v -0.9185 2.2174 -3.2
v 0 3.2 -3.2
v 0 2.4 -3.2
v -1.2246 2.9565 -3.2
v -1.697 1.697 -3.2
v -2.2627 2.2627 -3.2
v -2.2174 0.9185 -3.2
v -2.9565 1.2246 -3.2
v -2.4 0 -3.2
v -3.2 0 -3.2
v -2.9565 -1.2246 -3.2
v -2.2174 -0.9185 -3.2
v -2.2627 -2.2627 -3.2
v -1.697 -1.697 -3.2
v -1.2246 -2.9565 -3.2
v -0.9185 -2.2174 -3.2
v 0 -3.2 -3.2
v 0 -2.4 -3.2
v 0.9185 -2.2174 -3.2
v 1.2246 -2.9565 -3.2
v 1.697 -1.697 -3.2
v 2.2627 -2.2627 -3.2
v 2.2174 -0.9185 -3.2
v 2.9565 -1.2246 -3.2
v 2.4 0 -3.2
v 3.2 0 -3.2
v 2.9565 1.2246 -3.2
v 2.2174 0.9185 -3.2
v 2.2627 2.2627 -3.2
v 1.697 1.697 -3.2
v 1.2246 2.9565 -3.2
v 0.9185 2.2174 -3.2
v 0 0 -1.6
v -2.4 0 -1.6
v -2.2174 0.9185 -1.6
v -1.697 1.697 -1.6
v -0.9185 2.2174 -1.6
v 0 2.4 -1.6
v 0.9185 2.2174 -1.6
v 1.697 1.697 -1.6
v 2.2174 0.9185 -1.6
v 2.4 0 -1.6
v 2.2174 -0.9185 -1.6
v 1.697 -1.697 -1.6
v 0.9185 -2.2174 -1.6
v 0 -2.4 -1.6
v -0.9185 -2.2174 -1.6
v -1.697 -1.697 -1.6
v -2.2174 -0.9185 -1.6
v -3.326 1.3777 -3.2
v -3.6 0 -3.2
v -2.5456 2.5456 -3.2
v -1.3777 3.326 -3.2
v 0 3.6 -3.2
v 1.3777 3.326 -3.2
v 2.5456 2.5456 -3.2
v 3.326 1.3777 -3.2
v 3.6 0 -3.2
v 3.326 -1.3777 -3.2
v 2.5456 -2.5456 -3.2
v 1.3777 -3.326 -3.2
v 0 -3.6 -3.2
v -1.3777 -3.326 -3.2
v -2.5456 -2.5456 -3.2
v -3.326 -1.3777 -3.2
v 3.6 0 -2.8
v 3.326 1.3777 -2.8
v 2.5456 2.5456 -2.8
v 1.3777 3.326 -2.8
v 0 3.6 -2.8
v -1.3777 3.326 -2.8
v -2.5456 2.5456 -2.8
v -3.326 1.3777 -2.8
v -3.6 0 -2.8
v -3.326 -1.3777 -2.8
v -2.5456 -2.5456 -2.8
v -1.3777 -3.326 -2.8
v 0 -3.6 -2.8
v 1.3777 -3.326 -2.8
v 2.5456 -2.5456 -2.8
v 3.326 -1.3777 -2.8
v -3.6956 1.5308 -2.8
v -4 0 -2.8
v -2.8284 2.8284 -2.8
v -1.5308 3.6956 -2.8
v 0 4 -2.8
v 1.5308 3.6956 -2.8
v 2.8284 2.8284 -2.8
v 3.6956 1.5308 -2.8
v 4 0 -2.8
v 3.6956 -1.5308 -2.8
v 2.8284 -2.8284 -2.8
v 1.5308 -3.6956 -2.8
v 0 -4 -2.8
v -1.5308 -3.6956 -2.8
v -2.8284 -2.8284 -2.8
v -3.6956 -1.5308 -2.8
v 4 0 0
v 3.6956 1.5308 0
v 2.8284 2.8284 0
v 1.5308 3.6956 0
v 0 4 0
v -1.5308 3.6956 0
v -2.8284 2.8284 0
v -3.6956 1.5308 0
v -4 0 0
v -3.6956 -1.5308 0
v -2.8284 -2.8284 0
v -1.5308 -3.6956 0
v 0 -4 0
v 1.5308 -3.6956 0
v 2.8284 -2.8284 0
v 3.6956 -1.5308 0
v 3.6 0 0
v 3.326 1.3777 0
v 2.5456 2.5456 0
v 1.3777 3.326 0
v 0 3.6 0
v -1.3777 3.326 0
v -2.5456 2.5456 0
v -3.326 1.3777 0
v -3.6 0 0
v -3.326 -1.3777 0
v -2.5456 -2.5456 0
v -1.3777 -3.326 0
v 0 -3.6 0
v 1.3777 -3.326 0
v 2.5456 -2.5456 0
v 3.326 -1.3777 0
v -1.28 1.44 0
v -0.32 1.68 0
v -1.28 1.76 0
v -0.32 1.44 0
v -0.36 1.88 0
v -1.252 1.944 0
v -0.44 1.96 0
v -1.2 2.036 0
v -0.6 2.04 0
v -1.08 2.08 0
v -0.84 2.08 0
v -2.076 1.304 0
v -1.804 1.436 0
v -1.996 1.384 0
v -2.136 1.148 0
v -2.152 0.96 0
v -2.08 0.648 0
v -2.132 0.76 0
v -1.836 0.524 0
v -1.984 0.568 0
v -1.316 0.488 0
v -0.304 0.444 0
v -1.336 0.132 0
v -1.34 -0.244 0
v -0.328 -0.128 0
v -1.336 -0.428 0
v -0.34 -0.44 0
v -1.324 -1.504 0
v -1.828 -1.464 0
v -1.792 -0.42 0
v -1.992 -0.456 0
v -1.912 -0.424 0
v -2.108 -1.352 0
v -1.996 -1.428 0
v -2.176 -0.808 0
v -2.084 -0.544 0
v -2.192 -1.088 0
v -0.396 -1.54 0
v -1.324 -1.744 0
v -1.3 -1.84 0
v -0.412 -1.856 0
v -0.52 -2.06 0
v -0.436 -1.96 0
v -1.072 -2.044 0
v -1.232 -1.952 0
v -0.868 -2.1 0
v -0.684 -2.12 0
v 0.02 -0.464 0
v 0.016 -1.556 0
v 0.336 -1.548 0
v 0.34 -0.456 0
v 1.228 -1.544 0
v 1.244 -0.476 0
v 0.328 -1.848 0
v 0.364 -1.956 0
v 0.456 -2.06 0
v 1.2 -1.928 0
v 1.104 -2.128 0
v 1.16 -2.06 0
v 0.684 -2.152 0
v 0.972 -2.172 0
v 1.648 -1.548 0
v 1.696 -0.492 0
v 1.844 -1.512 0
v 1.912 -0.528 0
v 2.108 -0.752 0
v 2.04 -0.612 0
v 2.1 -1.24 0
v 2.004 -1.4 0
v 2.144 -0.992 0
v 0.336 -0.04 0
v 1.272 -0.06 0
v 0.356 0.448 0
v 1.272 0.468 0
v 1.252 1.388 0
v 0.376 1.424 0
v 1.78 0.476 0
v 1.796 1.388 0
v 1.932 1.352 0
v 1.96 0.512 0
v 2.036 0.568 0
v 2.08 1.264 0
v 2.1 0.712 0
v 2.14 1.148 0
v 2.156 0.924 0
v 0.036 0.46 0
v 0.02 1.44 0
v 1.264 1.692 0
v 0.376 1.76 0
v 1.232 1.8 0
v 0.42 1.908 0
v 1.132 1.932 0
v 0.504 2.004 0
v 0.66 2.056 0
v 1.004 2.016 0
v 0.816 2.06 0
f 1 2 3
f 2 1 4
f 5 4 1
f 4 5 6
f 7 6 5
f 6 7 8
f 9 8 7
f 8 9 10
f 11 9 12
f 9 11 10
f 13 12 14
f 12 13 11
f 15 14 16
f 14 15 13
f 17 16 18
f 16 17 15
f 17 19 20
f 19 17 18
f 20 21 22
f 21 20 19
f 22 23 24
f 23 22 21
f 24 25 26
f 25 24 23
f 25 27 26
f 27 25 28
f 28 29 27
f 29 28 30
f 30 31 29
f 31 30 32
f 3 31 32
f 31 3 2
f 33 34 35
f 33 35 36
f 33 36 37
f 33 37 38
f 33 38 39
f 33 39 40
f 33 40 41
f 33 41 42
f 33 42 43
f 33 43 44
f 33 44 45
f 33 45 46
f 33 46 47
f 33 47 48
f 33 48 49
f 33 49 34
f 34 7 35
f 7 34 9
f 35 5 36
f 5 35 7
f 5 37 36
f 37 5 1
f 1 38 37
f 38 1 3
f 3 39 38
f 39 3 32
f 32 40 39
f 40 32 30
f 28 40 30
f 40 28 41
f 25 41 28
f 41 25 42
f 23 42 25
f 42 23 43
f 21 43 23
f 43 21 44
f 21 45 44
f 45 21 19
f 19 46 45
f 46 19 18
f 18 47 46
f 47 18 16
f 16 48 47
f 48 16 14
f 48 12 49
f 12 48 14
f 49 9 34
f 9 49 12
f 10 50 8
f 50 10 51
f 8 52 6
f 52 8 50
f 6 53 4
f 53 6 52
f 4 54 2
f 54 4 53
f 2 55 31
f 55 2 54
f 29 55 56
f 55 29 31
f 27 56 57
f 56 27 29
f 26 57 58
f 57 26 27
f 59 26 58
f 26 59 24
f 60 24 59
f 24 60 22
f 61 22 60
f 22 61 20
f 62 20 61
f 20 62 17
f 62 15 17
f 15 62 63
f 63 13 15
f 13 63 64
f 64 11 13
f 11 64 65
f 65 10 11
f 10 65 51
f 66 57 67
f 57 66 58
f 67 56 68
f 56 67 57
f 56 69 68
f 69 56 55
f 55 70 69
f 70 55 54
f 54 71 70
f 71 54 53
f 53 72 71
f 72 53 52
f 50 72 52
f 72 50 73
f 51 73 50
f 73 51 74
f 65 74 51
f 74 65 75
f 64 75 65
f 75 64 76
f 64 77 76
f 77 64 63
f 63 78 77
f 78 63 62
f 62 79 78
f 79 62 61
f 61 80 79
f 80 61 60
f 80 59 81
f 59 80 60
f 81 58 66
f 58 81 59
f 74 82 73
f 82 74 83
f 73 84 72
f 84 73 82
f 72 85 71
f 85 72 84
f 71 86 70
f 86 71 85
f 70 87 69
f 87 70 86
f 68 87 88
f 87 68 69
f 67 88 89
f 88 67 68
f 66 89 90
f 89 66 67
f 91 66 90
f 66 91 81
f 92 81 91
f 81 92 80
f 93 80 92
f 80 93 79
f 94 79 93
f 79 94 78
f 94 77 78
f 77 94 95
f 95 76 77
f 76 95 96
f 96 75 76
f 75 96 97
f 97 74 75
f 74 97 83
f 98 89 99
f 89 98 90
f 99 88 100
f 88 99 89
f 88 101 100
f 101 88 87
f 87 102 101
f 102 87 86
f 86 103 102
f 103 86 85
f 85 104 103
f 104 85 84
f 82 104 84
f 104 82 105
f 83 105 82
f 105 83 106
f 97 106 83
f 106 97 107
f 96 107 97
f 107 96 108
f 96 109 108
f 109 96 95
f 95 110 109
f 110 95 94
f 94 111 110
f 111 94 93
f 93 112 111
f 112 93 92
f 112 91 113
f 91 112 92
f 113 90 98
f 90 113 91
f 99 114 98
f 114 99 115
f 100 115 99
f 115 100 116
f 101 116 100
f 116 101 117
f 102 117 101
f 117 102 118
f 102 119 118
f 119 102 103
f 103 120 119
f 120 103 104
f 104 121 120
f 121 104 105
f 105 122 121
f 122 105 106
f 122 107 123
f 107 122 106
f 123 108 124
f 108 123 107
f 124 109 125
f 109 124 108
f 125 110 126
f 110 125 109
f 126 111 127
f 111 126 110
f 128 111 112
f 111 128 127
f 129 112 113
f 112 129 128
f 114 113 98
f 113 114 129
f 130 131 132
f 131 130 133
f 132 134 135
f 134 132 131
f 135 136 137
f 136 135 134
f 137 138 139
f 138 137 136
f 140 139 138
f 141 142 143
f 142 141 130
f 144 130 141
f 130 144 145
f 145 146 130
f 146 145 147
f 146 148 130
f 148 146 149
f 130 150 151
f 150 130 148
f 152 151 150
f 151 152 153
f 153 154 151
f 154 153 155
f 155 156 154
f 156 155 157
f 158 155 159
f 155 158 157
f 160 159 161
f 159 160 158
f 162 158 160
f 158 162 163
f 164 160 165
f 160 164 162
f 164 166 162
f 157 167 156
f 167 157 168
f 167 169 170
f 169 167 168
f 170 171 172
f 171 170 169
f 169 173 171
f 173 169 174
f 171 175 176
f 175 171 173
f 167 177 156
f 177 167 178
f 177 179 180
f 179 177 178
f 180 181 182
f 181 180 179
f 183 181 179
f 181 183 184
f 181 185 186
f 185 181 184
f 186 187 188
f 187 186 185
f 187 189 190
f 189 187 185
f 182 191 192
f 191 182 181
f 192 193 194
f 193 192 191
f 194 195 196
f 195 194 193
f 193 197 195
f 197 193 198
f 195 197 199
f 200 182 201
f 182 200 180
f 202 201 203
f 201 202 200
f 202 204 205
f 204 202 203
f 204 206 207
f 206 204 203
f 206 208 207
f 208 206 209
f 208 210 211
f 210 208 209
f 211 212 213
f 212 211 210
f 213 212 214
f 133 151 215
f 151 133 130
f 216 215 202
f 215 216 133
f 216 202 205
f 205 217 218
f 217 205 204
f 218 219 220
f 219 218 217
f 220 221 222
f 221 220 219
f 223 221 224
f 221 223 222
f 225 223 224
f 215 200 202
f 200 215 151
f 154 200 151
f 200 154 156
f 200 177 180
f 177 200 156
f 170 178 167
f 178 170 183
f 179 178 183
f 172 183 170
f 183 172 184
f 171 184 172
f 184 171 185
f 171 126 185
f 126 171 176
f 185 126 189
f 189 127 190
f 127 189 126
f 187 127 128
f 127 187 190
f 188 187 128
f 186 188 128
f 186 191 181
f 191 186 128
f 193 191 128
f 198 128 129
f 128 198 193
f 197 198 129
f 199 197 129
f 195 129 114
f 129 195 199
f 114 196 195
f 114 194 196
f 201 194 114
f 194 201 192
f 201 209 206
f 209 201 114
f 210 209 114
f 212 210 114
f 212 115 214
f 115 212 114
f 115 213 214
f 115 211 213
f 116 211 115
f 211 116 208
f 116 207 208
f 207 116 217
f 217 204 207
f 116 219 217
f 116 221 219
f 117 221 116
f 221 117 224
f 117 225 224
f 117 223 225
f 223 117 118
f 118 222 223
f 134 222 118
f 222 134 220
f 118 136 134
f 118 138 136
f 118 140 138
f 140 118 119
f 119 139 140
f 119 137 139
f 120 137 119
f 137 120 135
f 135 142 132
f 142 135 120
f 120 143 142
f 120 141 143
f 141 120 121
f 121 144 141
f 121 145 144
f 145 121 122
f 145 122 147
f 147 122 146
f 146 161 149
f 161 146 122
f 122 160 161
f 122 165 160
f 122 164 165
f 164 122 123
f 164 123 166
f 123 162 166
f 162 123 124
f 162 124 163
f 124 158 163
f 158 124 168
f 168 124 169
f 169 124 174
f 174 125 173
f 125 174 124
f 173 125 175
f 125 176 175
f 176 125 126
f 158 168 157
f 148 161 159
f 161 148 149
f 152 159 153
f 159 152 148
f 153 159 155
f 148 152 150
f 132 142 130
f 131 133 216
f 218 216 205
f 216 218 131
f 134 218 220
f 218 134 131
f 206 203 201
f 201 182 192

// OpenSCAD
use <../lib.scad>
use <../p/4-4ering.scad>
use <s/98138s01.scad>
$fa=1; $fs=0.2;
function ldraw_lib__98138p2f(realsolid=false) = [
// 0 Tile  1 x  1 Round with Dark Torquoise "#" on Lavender Background Pattern
// 0 Name: 98138p2f.dat
// 0 Author: Willy Tschager [Holly-Wood]
// 0 !LDRAW_ORG Part UPDATE 2023-01
// 0 !LICENSE Licensed under CC BY 2.0 and CC BY 4.0 : see CAreadme.txt
// 
// 0 BFC CERTIFY CCW
  [0,"BFC","CERTIFY"],
  [0,"BFC","CCW"],
// 
// 0 !KEYWORDS Dots, Hash, Hashtag, Number Sign, Octothorp Sign, Pound Sign
// 0 !KEYWORDS Set Creativity Box
// 
// 0 !HISTORY 2022-12-20 [PTadmin] Official Update 2022-06
// 0 !HISTORY 2022-12-23 [Cheenzo] Added missing leading spaces in description
// 0 !HISTORY 2023-03-05 [OrionP] Official Update 2023-01
// 
// 
// 0 // Based on 98138p1n.dat by Gerald Lasser [GeraldLasser]
// 
// 1 16 0 0 0 1 0 0 0 1 0 0 0 1 s\98138s01.dat
  [1,16,0,0,0,1,0,0,0,1,0,0,0,1, ldraw_lib__s__98138s01(realsolid)],
// 1 31 0 0 0 9 0 0 0 1 0 0 0 9 4-4ering.dat
  [1,31,0,0,0,9,0,0,0,1,0,0,0,9, ldraw_lib__4_4ering(realsolid)],
// 4 3 -3.2 0 4.4 -3.2 0 3.6 -.8 0 3.6 -.8 0 4.2
  [4,3,-3.2,0,4.4,-3.2,0,3.6,-.8,0,3.6,-.8,0,4.2],
// 4 3 -3.13 0 4.86 -3.2 0 4.4 -.8 0 4.2 -.9 0 4.7
  [4,3,-3.13,0,4.86,-3.2,0,4.4,-.8,0,4.2,-.9,0,4.7],
// 4 3 -3.13 0 4.86 -.9 0 4.7 -1.1 0 4.9 -3 0 5.09
  [4,3,-3.13,0,4.86,-.9,0,4.7,-1.1,0,4.9,-3,0,5.09],
// 4 3 -2.7 0 5.2 -3 0 5.09 -1.1 0 4.9 -1.5 0 5.1
  [4,3,-2.7,0,5.2,-3,0,5.09,-1.1,0,4.9,-1.5,0,5.1],
// 3 3 -2.1 0 5.2 -2.7 0 5.2 -1.5 0 5.1
  [3,3,-2.1,0,5.2,-2.7,0,5.2,-1.5,0,5.1],
// 4 3 -3.2 0 3.6 -4.51 0 3.59 -4.99 0 3.46 -5.19 0 3.26
  [4,3,-3.2,0,3.6,-4.51,0,3.59,-4.99,0,3.46,-5.19,0,3.26],
// 4 3 -3.2 0 3.6 -5.19 0 3.26 -5.34 0 2.87 -5.38 0 2.4
  [4,3,-3.2,0,3.6,-5.19,0,3.26,-5.34,0,2.87,-5.38,0,2.4],
// 4 3 -3.2 0 3.6 -5.38 0 2.4 -5.33 0 1.9 -5.2 0 1.62
  [4,3,-3.2,0,3.6,-5.38,0,2.4,-5.33,0,1.9,-5.2,0,1.62],
// 4 3 -3.2 0 3.6 -5.2 0 1.62 -4.96 0 1.42 -4.59 0 1.31
  [4,3,-3.2,0,3.6,-5.2,0,1.62,-4.96,0,1.42,-4.59,0,1.31],
// 4 3 -3.2 0 3.6 -4.59 0 1.31 -3.29 0 1.22 -.76 0 1.11
  [4,3,-3.2,0,3.6,-4.59,0,1.31,-3.29,0,1.22,-.76,0,1.11],
// 4 3 -.76 0 1.11 -3.29 0 1.22 -3.34 0 .33 -3.35 0 -.61
  [4,3,-.76,0,1.11,-3.29,0,1.22,-3.34,0,.33,-3.35,0,-.61],
// 4 3 -.82 0 -.32 -.76 0 1.11 -3.35 0 -.61 -3.34 0 -1.07
  [4,3,-.82,0,-.32,-.76,0,1.11,-3.35,0,-.61,-3.34,0,-1.07],
// 4 3 -.85 0 -1.1 -.82 0 -.32 -3.34 0 -1.07 -3.31 0 -3.76
  [4,3,-.85,0,-1.1,-.82,0,-.32,-3.34,0,-1.07,-3.31,0,-3.76],
// 4 3 -4.57 0 -3.66 -3.31 0 -3.76 -3.34 0 -1.07 -4.48 0 -1.05
  [4,3,-4.57,0,-3.66,-3.31,0,-3.76,-3.34,0,-1.07,-4.48,0,-1.05],
// 4 3 -4.57 0 -3.66 -4.48 0 -1.05 -4.78 0 -1.06 -4.98 0 -1.14
  [4,3,-4.57,0,-3.66,-4.48,0,-1.05,-4.78,0,-1.06,-4.98,0,-1.14],
// 4 3 -4.99 0 -3.57 -4.57 0 -3.66 -4.98 0 -1.14 -5.27 0 -3.38
  [4,3,-4.99,0,-3.57,-4.57,0,-3.66,-4.98,0,-1.14,-5.27,0,-3.38],
// 4 3 -5.27 0 -3.38 -4.98 0 -1.14 -5.21 0 -1.36 -5.44 0 -2.02
  [4,3,-5.27,0,-3.38,-4.98,0,-1.14,-5.21,0,-1.36,-5.44,0,-2.02],
// 3 3 -5.44 0 -2.02 -5.48 0 -2.72 -5.27 0 -3.38
  [3,3,-5.44,0,-2.02,-5.48,0,-2.72,-5.27,0,-3.38],
// 4 3 -.99 0 -3.85 -.85 0 -1.1 -3.31 0 -3.76 -3.31 0 -4.36
  [4,3,-.99,0,-3.85,-.85,0,-1.1,-3.31,0,-3.76,-3.31,0,-4.36],
// 4 3 -.99 0 -3.85 -3.31 0 -4.36 -3.25 0 -4.6 -1.03 0 -4.64
  [4,3,-.99,0,-3.85,-3.31,0,-4.36,-3.25,0,-4.6,-1.03,0,-4.64],
// 4 3 -1.09 0 -4.9 -1.03 0 -4.64 -3.25 0 -4.6 -1.3 0 -5.15
  [4,3,-1.09,0,-4.9,-1.03,0,-4.64,-3.25,0,-4.6,-1.3,0,-5.15],
// 4 3 -1.3 0 -5.15 -3.25 0 -4.6 -3.08 0 -4.88 -2.68 0 -5.11
  [4,3,-1.3,0,-5.15,-3.25,0,-4.6,-3.08,0,-4.88,-2.68,0,-5.11],
// 4 3 -1.3 0 -5.15 -2.68 0 -5.11 -2.17 0 -5.25 -1.71 0 -5.3
  [4,3,-1.3,0,-5.15,-2.68,0,-5.11,-2.17,0,-5.25,-1.71,0,-5.3],
// 4 3 -.85 0 -1.1 -.99 0 -3.85 .04 0 -3.89 .05 0 -1.16
  [4,3,-.85,0,-1.1,-.99,0,-3.85,.04,0,-3.89,.05,0,-1.16],
// 4 3 .05 0 -1.16 .04 0 -3.89 .84 0 -3.87 .85 0 -1.14
  [4,3,.05,0,-1.16,.04,0,-3.89,.84,0,-3.87,.85,0,-1.14],
// 4 3 .85 0 -1.14 .84 0 -3.87 3.07 0 -3.86 3.11 0 -1.19
  [4,3,.85,0,-1.14,.84,0,-3.87,3.07,0,-3.86,3.11,0,-1.19],
// 4 3 3.07 0 -3.86 .84 0 -3.87 .82 0 -4.62 .91 0 -4.89
  [4,3,3.07,0,-3.86,.84,0,-3.87,.82,0,-4.62,.91,0,-4.89],
// 4 3 3.07 0 -3.86 .91 0 -4.89 1.14 0 -5.15 3 0 -4.82
  [4,3,3.07,0,-3.86,.91,0,-4.89,1.14,0,-5.15,3,0,-4.82],
// 4 3 2.9 0 -5.15 3 0 -4.82 1.14 0 -5.15 2.76 0 -5.32
  [4,3,2.9,0,-5.15,3,0,-4.82,1.14,0,-5.15,2.76,0,-5.32],
// 4 3 2.43 0 -5.43 2.76 0 -5.32 1.14 0 -5.15 1.71 0 -5.38
  [4,3,2.43,0,-5.43,2.76,0,-5.32,1.14,0,-5.15,1.71,0,-5.38],
// 4 3 4.24 0 -1.23 3.11 0 -1.19 3.07 0 -3.86 4.12 0 -3.87
  [4,3,4.24,0,-1.23,3.11,0,-1.19,3.07,0,-3.86,4.12,0,-3.87],
// 4 3 4.24 0 -1.23 4.12 0 -3.87 4.61 0 -3.78 4.78 0 -1.32
  [4,3,4.24,0,-1.23,4.12,0,-3.87,4.61,0,-3.78,4.78,0,-1.32],
// 4 3 5.1 0 -1.53 4.78 0 -1.32 4.61 0 -3.78 5.27 0 -1.88
  [4,3,5.1,0,-1.53,4.78,0,-1.32,4.61,0,-3.78,5.27,0,-1.88],
// 4 3 5.27 0 -1.88 4.61 0 -3.78 5.01 0 -3.5 5.25 0 -3.1
  [4,3,5.27,0,-1.88,4.61,0,-3.78,5.01,0,-3.5,5.25,0,-3.1],
// 3 3 5.27 0 -1.88 5.25 0 -3.1 5.36 0 -2.48
  [3,3,5.27,0,-1.88,5.25,0,-3.1,5.36,0,-2.48],
// 4 3 .85 0 -1.14 3.11 0 -1.19 3.18 0 -.15 .84 0 -.1
  [4,3,.85,0,-1.14,3.11,0,-1.19,3.18,0,-.15,.84,0,-.1],
// 4 3 .89 0 1.12 .84 0 -.1 3.18 0 -.15 3.18 0 1.17
  [4,3,.89,0,1.12,.84,0,-.1,3.18,0,-.15,3.18,0,1.17],
// 4 3 .89 0 1.12 3.18 0 1.17 3.13 0 3.47 .94 0 3.56
  [4,3,.89,0,1.12,3.18,0,1.17,3.13,0,3.47,.94,0,3.56],
// 4 3 3.13 0 3.47 3.18 0 1.17 4.45 0 1.19 4.49 0 3.47
  [4,3,3.13,0,3.47,3.18,0,1.17,4.45,0,1.19,4.49,0,3.47],
// 4 3 4.83 0 3.38 4.49 0 3.47 4.45 0 1.19 4.9 0 1.28
  [4,3,4.83,0,3.38,4.49,0,3.47,4.45,0,1.19,4.9,0,1.28],
// 4 3 4.83 0 3.38 4.9 0 1.28 5.09 0 1.42 5.2 0 3.16
  [4,3,4.83,0,3.38,4.9,0,1.28,5.09,0,1.42,5.2,0,3.16],
// 4 3 5.2 0 3.16 5.09 0 1.42 5.25 0 1.78 5.35 0 2.87
  [4,3,5.2,0,3.16,5.09,0,1.42,5.25,0,1.78,5.35,0,2.87],
// 3 3 5.35 0 2.87 5.25 0 1.78 5.39 0 2.31
  [3,3,5.35,0,2.87,5.25,0,1.78,5.39,0,2.31],
// 4 3 -.76 0 1.11 .09 0 1.15 -.8 0 3.6 -3.2 0 3.6
  [4,3,-.76,0,1.11,.09,0,1.15,-.8,0,3.6,-3.2,0,3.6],
// 4 3 .05 0 3.6 -.8 0 3.6 .09 0 1.15 .89 0 1.12
  [4,3,.05,0,3.6,-.8,0,3.6,.09,0,1.15,.89,0,1.12],
// 3 3 .05 0 3.6 .89 0 1.12 .94 0 3.56
  [3,3,.05,0,3.6,.89,0,1.12,.94,0,3.56],
// 4 3 .94 0 4.4 .94 0 3.56 3.13 0 3.47 3.16 0 4.23
  [4,3,.94,0,4.4,.94,0,3.56,3.13,0,3.47,3.16,0,4.23],
// 4 3 .94 0 4.4 3.16 0 4.23 3.08 0 4.5 1.05 0 4.77
  [4,3,.94,0,4.4,3.16,0,4.23,3.08,0,4.5,1.05,0,4.77],
// 4 3 1.26 0 5.01 1.05 0 4.77 3.08 0 4.5 2.83 0 4.83
  [4,3,1.26,0,5.01,1.05,0,4.77,3.08,0,4.5,2.83,0,4.83],
// 4 3 1.26 0 5.01 2.83 0 4.83 2.51 0 5.04 1.65 0 5.14
  [4,3,1.26,0,5.01,2.83,0,4.83,2.51,0,5.04,1.65,0,5.14],
// 3 3 2.04 0 5.15 1.65 0 5.14 2.51 0 5.04
  [3,3,2.04,0,5.15,1.65,0,5.14,2.51,0,5.04],
// 4 31 .84 0 -.1 .89 0 1.12 .09 0 1.15 -.76 0 1.11
  [4,31,.84,0,-.1,.89,0,1.12,.09,0,1.15,-.76,0,1.11],
// 4 31 .84 0 -.1 -.76 0 1.11 -.82 0 -.32 -.85 0 -1.1
  [4,31,.84,0,-.1,-.76,0,1.11,-.82,0,-.32,-.85,0,-1.1],
// 4 31 .84 0 -.1 -.85 0 -1.1 .05 0 -1.16 .85 0 -1.14
  [4,31,.84,0,-.1,-.85,0,-1.1,.05,0,-1.16,.85,0,-1.14],
// 4 31 .04 0 -3.89 -.99 0 -3.85 -1.03 0 -4.64 .82 0 -4.62
  [4,31,.04,0,-3.89,-.99,0,-3.85,-1.03,0,-4.64,.82,0,-4.62],
// 3 31 .84 0 -3.87 .04 0 -3.89 .82 0 -4.62
  [3,31,.84,0,-3.87,.04,0,-3.89,.82,0,-4.62],
// 4 31 -1.03 0 -4.64 -1.09 0 -4.9 .91 0 -4.89 .82 0 -4.62
  [4,31,-1.03,0,-4.64,-1.09,0,-4.9,.91,0,-4.89,.82,0,-4.62],
// 4 31 -1.09 0 -4.9 -1.3 0 -5.15 1.14 0 -5.15 .91 0 -4.89
  [4,31,-1.09,0,-4.9,-1.3,0,-5.15,1.14,0,-5.15,.91,0,-4.89],
// 4 31 -1.3 0 -5.15 -1.71 0 -5.3 0 0 -9 1.14 0 -5.15
  [4,31,-1.3,0,-5.15,-1.71,0,-5.3,0,0,-9,1.14,0,-5.15],
// 3 31 1.14 0 -5.15 0 0 -9 1.71 0 -5.38
  [3,31,1.14,0,-5.15,0,0,-9,1.71,0,-5.38],
// 4 31 2.43 0 -5.43 1.71 0 -5.38 0 0 -9 3.4443 0 -8.3151
  [4,31,2.43,0,-5.43,1.71,0,-5.38,0,0,-9,3.4443,0,-8.3151],
// 4 31 2.76 0 -5.32 2.43 0 -5.43 3.4443 0 -8.3151 6.3639 0 -6.3639
  [4,31,2.76,0,-5.32,2.43,0,-5.43,3.4443,0,-8.3151,6.3639,0,-6.3639],
// 3 31 2.9 0 -5.15 2.76 0 -5.32 6.3639 0 -6.3639
  [3,31,2.9,0,-5.15,2.76,0,-5.32,6.3639,0,-6.3639],
// 3 31 3 0 -4.82 2.9 0 -5.15 6.3639 0 -6.3639
  [3,31,3,0,-4.82,2.9,0,-5.15,6.3639,0,-6.3639],
// 4 31 3.07 0 -3.86 3 0 -4.82 6.3639 0 -6.3639 4.12 0 -3.87
  [4,31,3.07,0,-3.86,3,0,-4.82,6.3639,0,-6.3639,4.12,0,-3.87],
// 3 31 4.61 0 -3.78 4.12 0 -3.87 6.3639 0 -6.3639
  [3,31,4.61,0,-3.78,4.12,0,-3.87,6.3639,0,-6.3639],
// 4 31 5.01 0 -3.5 4.61 0 -3.78 6.3639 0 -6.3639 8.3151 0 -3.4443
  [4,31,5.01,0,-3.5,4.61,0,-3.78,6.3639,0,-6.3639,8.3151,0,-3.4443],
// 3 31 5.25 0 -3.1 5.01 0 -3.5 8.3151 0 -3.4443
  [3,31,5.25,0,-3.1,5.01,0,-3.5,8.3151,0,-3.4443],
// 3 31 5.36 0 -2.48 5.25 0 -3.1 8.3151 0 -3.4443
  [3,31,5.36,0,-2.48,5.25,0,-3.1,8.3151,0,-3.4443],
// 4 31 5.27 0 -1.88 5.36 0 -2.48 8.3151 0 -3.4443 9 0 0
  [4,31,5.27,0,-1.88,5.36,0,-2.48,8.3151,0,-3.4443,9,0,0],
// 3 31 9 0 0 5.1 0 -1.53 5.27 0 -1.88
  [3,31,9,0,0,5.1,0,-1.53,5.27,0,-1.88],
// 3 31 9 0 0 4.78 0 -1.32 5.1 0 -1.53
  [3,31,9,0,0,4.78,0,-1.32,5.1,0,-1.53],
// 4 31 4.24 0 -1.23 4.78 0 -1.32 9 0 0 3.18 0 -.15
  [4,31,4.24,0,-1.23,4.78,0,-1.32,9,0,0,3.18,0,-.15],
// 4 31 4.45 0 1.19 3.18 0 -.15 9 0 0 4.9 0 1.28
  [4,31,4.45,0,1.19,3.18,0,-.15,9,0,0,4.9,0,1.28],
// 3 31 5.09 0 1.42 4.9 0 1.28 9 0 0
  [3,31,5.09,0,1.42,4.9,0,1.28,9,0,0],
// 3 31 5.25 0 1.78 5.09 0 1.42 9 0 0
  [3,31,5.25,0,1.78,5.09,0,1.42,9,0,0],
// 4 31 5.39 0 2.31 5.25 0 1.78 9 0 0 8.3151 0 3.4443
  [4,31,5.39,0,2.31,5.25,0,1.78,9,0,0,8.3151,0,3.4443],
// 3 31 8.3151 0 3.4443 5.35 0 2.87 5.39 0 2.31
  [3,31,8.3151,0,3.4443,5.35,0,2.87,5.39,0,2.31],
// 3 31 8.3151 0 3.4443 5.2 0 3.16 5.35 0 2.87
  [3,31,8.3151,0,3.4443,5.2,0,3.16,5.35,0,2.87],
// 4 31 4.83 0 3.38 5.2 0 3.16 8.3151 0 3.4443 6.3639 0 6.3639
  [4,31,4.83,0,3.38,5.2,0,3.16,8.3151,0,3.4443,6.3639,0,6.3639],
// 4 31 4.49 0 3.47 4.83 0 3.38 6.3639 0 6.3639 3.16 0 4.23
  [4,31,4.49,0,3.47,4.83,0,3.38,6.3639,0,6.3639,3.16,0,4.23],
// 3 31 3.16 0 4.23 3.13 0 3.47 4.49 0 3.47
  [3,31,3.16,0,4.23,3.13,0,3.47,4.49,0,3.47],
// 3 31 6.3639 0 6.3639 3.08 0 4.5 3.16 0 4.23
  [3,31,6.3639,0,6.3639,3.08,0,4.5,3.16,0,4.23],
// 3 31 6.3639 0 6.3639 2.83 0 4.83 3.08 0 4.5
  [3,31,6.3639,0,6.3639,2.83,0,4.83,3.08,0,4.5],
// 4 31 2.51 0 5.04 2.83 0 4.83 6.3639 0 6.3639 3.4443 0 8.3151
  [4,31,2.51,0,5.04,2.83,0,4.83,6.3639,0,6.3639,3.4443,0,8.3151],
// 3 31 3.4443 0 8.3151 2.04 0 5.15 2.51 0 5.04
  [3,31,3.4443,0,8.3151,2.04,0,5.15,2.51,0,5.04],
// 4 31 1.65 0 5.14 2.04 0 5.15 3.4443 0 8.3151 0 0 9
  [4,31,1.65,0,5.14,2.04,0,5.15,3.4443,0,8.3151,0,0,9],
// 3 31 0 0 9 1.26 0 5.01 1.65 0 5.14
  [3,31,0,0,9,1.26,0,5.01,1.65,0,5.14],
// 4 31 1.05 0 4.77 1.26 0 5.01 0 0 9 -.9 0 4.7
  [4,31,1.05,0,4.77,1.26,0,5.01,0,0,9,-.9,0,4.7],
// 3 31 0 0 9 -1.1 0 4.9 -.9 0 4.7
  [3,31,0,0,9,-1.1,0,4.9,-.9,0,4.7],
// 3 31 0 0 9 -1.5 0 5.1 -1.1 0 4.9
  [3,31,0,0,9,-1.5,0,5.1,-1.1,0,4.9],
// 4 31 -2.1 0 5.2 -1.5 0 5.1 0 0 9 -3.4443 0 8.3151
  [4,31,-2.1,0,5.2,-1.5,0,5.1,0,0,9,-3.4443,0,8.3151],
// 3 31 -3.4443 0 8.3151 -2.7 0 5.2 -2.1 0 5.2
  [3,31,-3.4443,0,8.3151,-2.7,0,5.2,-2.1,0,5.2],
// 3 31 -3.4443 0 8.3151 -3 0 5.09 -2.7 0 5.2
  [3,31,-3.4443,0,8.3151,-3,0,5.09,-2.7,0,5.2],
// 4 31 -3.13 0 4.86 -3 0 5.09 -3.4443 0 8.3151 -6.3639 0 6.3639
  [4,31,-3.13,0,4.86,-3,0,5.09,-3.4443,0,8.3151,-6.3639,0,6.3639],
// 4 31 -3.2 0 4.4 -3.13 0 4.86 -6.3639 0 6.3639 -4.51 0 3.59
  [4,31,-3.2,0,4.4,-3.13,0,4.86,-6.3639,0,6.3639,-4.51,0,3.59],
// 3 31 -6.3639 0 6.3639 -4.99 0 3.46 -4.51 0 3.59
  [3,31,-6.3639,0,6.3639,-4.99,0,3.46,-4.51,0,3.59],
// 4 31 -5.19 0 3.26 -4.99 0 3.46 -6.3639 0 6.3639 -8.3151 0 3.4443
  [4,31,-5.19,0,3.26,-4.99,0,3.46,-6.3639,0,6.3639,-8.3151,0,3.4443],
// 3 31 -8.3151 0 3.4443 -5.34 0 2.87 -5.19 0 3.26
  [3,31,-8.3151,0,3.4443,-5.34,0,2.87,-5.19,0,3.26],
// 4 31 -5.38 0 2.4 -5.34 0 2.87 -8.3151 0 3.4443 -9 0 0
  [4,31,-5.38,0,2.4,-5.34,0,2.87,-8.3151,0,3.4443,-9,0,0],
// 3 31 -5.38 0 2.4 -9 0 0 -5.33 0 1.9
  [3,31,-5.38,0,2.4,-9,0,0,-5.33,0,1.9],
// 3 31 -5.33 0 1.9 -9 0 0 -5.2 0 1.62
  [3,31,-5.33,0,1.9,-9,0,0,-5.2,0,1.62],
// 4 31 -4.96 0 1.42 -5.2 0 1.62 -9 0 0 -4.78 0 -1.06
  [4,31,-4.96,0,1.42,-5.2,0,1.62,-9,0,0,-4.78,0,-1.06],
// 3 31 -9 0 0 -4.98 0 -1.14 -4.78 0 -1.06
  [3,31,-9,0,0,-4.98,0,-1.14,-4.78,0,-1.06],
// 3 31 -9 0 0 -5.21 0 -1.36 -4.98 0 -1.14
  [3,31,-9,0,0,-5.21,0,-1.36,-4.98,0,-1.14],
// 4 31 -5.44 0 -2.02 -5.21 0 -1.36 -9 0 0 -8.3151 0 -3.4443
  [4,31,-5.44,0,-2.02,-5.21,0,-1.36,-9,0,0,-8.3151,0,-3.4443],
// 3 31 -5.44 0 -2.02 -8.3151 0 -3.4443 -5.48 0 -2.72
  [3,31,-5.44,0,-2.02,-8.3151,0,-3.4443,-5.48,0,-2.72],
// 4 31 -5.27 0 -3.38 -5.48 0 -2.72 -8.3151 0 -3.4443 -6.3639 0 -6.3639
  [4,31,-5.27,0,-3.38,-5.48,0,-2.72,-8.3151,0,-3.4443,-6.3639,0,-6.3639],
// 3 31 -5.27 0 -3.38 -6.3639 0 -6.3639 -4.99 0 -3.57
  [3,31,-5.27,0,-3.38,-6.3639,0,-6.3639,-4.99,0,-3.57],
// 4 31 -4.57 0 -3.66 -4.99 0 -3.57 -6.3639 0 -6.3639 -3.31 0 -4.36
  [4,31,-4.57,0,-3.66,-4.99,0,-3.57,-6.3639,0,-6.3639,-3.31,0,-4.36],
// 3 31 -3.31 0 -4.36 -6.3639 0 -6.3639 -3.25 0 -4.6
  [3,31,-3.31,0,-4.36,-6.3639,0,-6.3639,-3.25,0,-4.6],
// 3 31 -3.25 0 -4.6 -6.3639 0 -6.3639 -3.08 0 -4.88
  [3,31,-3.25,0,-4.6,-6.3639,0,-6.3639,-3.08,0,-4.88],
// 4 31 -2.68 0 -5.11 -3.08 0 -4.88 -6.3639 0 -6.3639 -3.4443 0 -8.3151
  [4,31,-2.68,0,-5.11,-3.08,0,-4.88,-6.3639,0,-6.3639,-3.4443,0,-8.3151],
// 3 31 -2.68 0 -5.11 -3.4443 0 -8.3151 -2.17 0 -5.25
  [3,31,-2.68,0,-5.11,-3.4443,0,-8.3151,-2.17,0,-5.25],
// 4 31 -1.71 0 -5.3 -2.17 0 -5.25 -3.4443 0 -8.3151 0 0 -9
  [4,31,-1.71,0,-5.3,-2.17,0,-5.25,-3.4443,0,-8.3151,0,0,-9],
// 3 31 -4.57 0 -3.66 -3.31 0 -4.36 -3.31 0 -3.76
  [3,31,-4.57,0,-3.66,-3.31,0,-4.36,-3.31,0,-3.76],
// 4 31 -4.96 0 1.42 -4.78 0 -1.06 -4.48 0 -1.05 -4.59 0 1.31
  [4,31,-4.96,0,1.42,-4.78,0,-1.06,-4.48,0,-1.05,-4.59,0,1.31],
// 4 31 -3.34 0 .33 -4.59 0 1.31 -4.48 0 -1.05 -3.35 0 -.61
  [4,31,-3.34,0,.33,-4.59,0,1.31,-4.48,0,-1.05,-3.35,0,-.61],
// 3 31 -3.35 0 -.61 -4.48 0 -1.05 -3.34 0 -1.07
  [3,31,-3.35,0,-.61,-4.48,0,-1.05,-3.34,0,-1.07],
// 3 31 -4.59 0 1.31 -3.34 0 .33 -3.29 0 1.22
  [3,31,-4.59,0,1.31,-3.34,0,.33,-3.29,0,1.22],
// 3 31 -3.2 0 4.4 -4.51 0 3.59 -3.2 0 3.6
  [3,31,-3.2,0,4.4,-4.51,0,3.59,-3.2,0,3.6],
// 3 31 -.8 0 4.2 -.8 0 3.6 .05 0 3.6
  [3,31,-.8,0,4.2,-.8,0,3.6,.05,0,3.6],
// 4 31 -.8 0 4.2 .05 0 3.6 .94 0 3.56 .94 0 4.4
  [4,31,-.8,0,4.2,.05,0,3.6,.94,0,3.56,.94,0,4.4],
// 4 31 -.9 0 4.7 -.8 0 4.2 .94 0 4.4 1.05 0 4.77
  [4,31,-.9,0,4.7,-.8,0,4.2,.94,0,4.4,1.05,0,4.77],
// 3 31 4.45 0 1.19 3.18 0 1.17 3.18 0 -.15
  [3,31,4.45,0,1.19,3.18,0,1.17,3.18,0,-.15],
// 3 31 3.18 0 -.15 3.11 0 -1.19 4.24 0 -1.23
  [3,31,3.18,0,-.15,3.11,0,-1.19,4.24,0,-1.23],
];
module ldraw_lib__98138p2f(step=0, col=false, unit=2/5, alt=false, line=0.2, solid=!$preview)
    makepoly(ldraw_lib__98138p2f(solid), step=step, col=col, unit=unit, alt=alt, line=line, solid=solid);
ldraw_lib__98138p2f(line=0.2);
